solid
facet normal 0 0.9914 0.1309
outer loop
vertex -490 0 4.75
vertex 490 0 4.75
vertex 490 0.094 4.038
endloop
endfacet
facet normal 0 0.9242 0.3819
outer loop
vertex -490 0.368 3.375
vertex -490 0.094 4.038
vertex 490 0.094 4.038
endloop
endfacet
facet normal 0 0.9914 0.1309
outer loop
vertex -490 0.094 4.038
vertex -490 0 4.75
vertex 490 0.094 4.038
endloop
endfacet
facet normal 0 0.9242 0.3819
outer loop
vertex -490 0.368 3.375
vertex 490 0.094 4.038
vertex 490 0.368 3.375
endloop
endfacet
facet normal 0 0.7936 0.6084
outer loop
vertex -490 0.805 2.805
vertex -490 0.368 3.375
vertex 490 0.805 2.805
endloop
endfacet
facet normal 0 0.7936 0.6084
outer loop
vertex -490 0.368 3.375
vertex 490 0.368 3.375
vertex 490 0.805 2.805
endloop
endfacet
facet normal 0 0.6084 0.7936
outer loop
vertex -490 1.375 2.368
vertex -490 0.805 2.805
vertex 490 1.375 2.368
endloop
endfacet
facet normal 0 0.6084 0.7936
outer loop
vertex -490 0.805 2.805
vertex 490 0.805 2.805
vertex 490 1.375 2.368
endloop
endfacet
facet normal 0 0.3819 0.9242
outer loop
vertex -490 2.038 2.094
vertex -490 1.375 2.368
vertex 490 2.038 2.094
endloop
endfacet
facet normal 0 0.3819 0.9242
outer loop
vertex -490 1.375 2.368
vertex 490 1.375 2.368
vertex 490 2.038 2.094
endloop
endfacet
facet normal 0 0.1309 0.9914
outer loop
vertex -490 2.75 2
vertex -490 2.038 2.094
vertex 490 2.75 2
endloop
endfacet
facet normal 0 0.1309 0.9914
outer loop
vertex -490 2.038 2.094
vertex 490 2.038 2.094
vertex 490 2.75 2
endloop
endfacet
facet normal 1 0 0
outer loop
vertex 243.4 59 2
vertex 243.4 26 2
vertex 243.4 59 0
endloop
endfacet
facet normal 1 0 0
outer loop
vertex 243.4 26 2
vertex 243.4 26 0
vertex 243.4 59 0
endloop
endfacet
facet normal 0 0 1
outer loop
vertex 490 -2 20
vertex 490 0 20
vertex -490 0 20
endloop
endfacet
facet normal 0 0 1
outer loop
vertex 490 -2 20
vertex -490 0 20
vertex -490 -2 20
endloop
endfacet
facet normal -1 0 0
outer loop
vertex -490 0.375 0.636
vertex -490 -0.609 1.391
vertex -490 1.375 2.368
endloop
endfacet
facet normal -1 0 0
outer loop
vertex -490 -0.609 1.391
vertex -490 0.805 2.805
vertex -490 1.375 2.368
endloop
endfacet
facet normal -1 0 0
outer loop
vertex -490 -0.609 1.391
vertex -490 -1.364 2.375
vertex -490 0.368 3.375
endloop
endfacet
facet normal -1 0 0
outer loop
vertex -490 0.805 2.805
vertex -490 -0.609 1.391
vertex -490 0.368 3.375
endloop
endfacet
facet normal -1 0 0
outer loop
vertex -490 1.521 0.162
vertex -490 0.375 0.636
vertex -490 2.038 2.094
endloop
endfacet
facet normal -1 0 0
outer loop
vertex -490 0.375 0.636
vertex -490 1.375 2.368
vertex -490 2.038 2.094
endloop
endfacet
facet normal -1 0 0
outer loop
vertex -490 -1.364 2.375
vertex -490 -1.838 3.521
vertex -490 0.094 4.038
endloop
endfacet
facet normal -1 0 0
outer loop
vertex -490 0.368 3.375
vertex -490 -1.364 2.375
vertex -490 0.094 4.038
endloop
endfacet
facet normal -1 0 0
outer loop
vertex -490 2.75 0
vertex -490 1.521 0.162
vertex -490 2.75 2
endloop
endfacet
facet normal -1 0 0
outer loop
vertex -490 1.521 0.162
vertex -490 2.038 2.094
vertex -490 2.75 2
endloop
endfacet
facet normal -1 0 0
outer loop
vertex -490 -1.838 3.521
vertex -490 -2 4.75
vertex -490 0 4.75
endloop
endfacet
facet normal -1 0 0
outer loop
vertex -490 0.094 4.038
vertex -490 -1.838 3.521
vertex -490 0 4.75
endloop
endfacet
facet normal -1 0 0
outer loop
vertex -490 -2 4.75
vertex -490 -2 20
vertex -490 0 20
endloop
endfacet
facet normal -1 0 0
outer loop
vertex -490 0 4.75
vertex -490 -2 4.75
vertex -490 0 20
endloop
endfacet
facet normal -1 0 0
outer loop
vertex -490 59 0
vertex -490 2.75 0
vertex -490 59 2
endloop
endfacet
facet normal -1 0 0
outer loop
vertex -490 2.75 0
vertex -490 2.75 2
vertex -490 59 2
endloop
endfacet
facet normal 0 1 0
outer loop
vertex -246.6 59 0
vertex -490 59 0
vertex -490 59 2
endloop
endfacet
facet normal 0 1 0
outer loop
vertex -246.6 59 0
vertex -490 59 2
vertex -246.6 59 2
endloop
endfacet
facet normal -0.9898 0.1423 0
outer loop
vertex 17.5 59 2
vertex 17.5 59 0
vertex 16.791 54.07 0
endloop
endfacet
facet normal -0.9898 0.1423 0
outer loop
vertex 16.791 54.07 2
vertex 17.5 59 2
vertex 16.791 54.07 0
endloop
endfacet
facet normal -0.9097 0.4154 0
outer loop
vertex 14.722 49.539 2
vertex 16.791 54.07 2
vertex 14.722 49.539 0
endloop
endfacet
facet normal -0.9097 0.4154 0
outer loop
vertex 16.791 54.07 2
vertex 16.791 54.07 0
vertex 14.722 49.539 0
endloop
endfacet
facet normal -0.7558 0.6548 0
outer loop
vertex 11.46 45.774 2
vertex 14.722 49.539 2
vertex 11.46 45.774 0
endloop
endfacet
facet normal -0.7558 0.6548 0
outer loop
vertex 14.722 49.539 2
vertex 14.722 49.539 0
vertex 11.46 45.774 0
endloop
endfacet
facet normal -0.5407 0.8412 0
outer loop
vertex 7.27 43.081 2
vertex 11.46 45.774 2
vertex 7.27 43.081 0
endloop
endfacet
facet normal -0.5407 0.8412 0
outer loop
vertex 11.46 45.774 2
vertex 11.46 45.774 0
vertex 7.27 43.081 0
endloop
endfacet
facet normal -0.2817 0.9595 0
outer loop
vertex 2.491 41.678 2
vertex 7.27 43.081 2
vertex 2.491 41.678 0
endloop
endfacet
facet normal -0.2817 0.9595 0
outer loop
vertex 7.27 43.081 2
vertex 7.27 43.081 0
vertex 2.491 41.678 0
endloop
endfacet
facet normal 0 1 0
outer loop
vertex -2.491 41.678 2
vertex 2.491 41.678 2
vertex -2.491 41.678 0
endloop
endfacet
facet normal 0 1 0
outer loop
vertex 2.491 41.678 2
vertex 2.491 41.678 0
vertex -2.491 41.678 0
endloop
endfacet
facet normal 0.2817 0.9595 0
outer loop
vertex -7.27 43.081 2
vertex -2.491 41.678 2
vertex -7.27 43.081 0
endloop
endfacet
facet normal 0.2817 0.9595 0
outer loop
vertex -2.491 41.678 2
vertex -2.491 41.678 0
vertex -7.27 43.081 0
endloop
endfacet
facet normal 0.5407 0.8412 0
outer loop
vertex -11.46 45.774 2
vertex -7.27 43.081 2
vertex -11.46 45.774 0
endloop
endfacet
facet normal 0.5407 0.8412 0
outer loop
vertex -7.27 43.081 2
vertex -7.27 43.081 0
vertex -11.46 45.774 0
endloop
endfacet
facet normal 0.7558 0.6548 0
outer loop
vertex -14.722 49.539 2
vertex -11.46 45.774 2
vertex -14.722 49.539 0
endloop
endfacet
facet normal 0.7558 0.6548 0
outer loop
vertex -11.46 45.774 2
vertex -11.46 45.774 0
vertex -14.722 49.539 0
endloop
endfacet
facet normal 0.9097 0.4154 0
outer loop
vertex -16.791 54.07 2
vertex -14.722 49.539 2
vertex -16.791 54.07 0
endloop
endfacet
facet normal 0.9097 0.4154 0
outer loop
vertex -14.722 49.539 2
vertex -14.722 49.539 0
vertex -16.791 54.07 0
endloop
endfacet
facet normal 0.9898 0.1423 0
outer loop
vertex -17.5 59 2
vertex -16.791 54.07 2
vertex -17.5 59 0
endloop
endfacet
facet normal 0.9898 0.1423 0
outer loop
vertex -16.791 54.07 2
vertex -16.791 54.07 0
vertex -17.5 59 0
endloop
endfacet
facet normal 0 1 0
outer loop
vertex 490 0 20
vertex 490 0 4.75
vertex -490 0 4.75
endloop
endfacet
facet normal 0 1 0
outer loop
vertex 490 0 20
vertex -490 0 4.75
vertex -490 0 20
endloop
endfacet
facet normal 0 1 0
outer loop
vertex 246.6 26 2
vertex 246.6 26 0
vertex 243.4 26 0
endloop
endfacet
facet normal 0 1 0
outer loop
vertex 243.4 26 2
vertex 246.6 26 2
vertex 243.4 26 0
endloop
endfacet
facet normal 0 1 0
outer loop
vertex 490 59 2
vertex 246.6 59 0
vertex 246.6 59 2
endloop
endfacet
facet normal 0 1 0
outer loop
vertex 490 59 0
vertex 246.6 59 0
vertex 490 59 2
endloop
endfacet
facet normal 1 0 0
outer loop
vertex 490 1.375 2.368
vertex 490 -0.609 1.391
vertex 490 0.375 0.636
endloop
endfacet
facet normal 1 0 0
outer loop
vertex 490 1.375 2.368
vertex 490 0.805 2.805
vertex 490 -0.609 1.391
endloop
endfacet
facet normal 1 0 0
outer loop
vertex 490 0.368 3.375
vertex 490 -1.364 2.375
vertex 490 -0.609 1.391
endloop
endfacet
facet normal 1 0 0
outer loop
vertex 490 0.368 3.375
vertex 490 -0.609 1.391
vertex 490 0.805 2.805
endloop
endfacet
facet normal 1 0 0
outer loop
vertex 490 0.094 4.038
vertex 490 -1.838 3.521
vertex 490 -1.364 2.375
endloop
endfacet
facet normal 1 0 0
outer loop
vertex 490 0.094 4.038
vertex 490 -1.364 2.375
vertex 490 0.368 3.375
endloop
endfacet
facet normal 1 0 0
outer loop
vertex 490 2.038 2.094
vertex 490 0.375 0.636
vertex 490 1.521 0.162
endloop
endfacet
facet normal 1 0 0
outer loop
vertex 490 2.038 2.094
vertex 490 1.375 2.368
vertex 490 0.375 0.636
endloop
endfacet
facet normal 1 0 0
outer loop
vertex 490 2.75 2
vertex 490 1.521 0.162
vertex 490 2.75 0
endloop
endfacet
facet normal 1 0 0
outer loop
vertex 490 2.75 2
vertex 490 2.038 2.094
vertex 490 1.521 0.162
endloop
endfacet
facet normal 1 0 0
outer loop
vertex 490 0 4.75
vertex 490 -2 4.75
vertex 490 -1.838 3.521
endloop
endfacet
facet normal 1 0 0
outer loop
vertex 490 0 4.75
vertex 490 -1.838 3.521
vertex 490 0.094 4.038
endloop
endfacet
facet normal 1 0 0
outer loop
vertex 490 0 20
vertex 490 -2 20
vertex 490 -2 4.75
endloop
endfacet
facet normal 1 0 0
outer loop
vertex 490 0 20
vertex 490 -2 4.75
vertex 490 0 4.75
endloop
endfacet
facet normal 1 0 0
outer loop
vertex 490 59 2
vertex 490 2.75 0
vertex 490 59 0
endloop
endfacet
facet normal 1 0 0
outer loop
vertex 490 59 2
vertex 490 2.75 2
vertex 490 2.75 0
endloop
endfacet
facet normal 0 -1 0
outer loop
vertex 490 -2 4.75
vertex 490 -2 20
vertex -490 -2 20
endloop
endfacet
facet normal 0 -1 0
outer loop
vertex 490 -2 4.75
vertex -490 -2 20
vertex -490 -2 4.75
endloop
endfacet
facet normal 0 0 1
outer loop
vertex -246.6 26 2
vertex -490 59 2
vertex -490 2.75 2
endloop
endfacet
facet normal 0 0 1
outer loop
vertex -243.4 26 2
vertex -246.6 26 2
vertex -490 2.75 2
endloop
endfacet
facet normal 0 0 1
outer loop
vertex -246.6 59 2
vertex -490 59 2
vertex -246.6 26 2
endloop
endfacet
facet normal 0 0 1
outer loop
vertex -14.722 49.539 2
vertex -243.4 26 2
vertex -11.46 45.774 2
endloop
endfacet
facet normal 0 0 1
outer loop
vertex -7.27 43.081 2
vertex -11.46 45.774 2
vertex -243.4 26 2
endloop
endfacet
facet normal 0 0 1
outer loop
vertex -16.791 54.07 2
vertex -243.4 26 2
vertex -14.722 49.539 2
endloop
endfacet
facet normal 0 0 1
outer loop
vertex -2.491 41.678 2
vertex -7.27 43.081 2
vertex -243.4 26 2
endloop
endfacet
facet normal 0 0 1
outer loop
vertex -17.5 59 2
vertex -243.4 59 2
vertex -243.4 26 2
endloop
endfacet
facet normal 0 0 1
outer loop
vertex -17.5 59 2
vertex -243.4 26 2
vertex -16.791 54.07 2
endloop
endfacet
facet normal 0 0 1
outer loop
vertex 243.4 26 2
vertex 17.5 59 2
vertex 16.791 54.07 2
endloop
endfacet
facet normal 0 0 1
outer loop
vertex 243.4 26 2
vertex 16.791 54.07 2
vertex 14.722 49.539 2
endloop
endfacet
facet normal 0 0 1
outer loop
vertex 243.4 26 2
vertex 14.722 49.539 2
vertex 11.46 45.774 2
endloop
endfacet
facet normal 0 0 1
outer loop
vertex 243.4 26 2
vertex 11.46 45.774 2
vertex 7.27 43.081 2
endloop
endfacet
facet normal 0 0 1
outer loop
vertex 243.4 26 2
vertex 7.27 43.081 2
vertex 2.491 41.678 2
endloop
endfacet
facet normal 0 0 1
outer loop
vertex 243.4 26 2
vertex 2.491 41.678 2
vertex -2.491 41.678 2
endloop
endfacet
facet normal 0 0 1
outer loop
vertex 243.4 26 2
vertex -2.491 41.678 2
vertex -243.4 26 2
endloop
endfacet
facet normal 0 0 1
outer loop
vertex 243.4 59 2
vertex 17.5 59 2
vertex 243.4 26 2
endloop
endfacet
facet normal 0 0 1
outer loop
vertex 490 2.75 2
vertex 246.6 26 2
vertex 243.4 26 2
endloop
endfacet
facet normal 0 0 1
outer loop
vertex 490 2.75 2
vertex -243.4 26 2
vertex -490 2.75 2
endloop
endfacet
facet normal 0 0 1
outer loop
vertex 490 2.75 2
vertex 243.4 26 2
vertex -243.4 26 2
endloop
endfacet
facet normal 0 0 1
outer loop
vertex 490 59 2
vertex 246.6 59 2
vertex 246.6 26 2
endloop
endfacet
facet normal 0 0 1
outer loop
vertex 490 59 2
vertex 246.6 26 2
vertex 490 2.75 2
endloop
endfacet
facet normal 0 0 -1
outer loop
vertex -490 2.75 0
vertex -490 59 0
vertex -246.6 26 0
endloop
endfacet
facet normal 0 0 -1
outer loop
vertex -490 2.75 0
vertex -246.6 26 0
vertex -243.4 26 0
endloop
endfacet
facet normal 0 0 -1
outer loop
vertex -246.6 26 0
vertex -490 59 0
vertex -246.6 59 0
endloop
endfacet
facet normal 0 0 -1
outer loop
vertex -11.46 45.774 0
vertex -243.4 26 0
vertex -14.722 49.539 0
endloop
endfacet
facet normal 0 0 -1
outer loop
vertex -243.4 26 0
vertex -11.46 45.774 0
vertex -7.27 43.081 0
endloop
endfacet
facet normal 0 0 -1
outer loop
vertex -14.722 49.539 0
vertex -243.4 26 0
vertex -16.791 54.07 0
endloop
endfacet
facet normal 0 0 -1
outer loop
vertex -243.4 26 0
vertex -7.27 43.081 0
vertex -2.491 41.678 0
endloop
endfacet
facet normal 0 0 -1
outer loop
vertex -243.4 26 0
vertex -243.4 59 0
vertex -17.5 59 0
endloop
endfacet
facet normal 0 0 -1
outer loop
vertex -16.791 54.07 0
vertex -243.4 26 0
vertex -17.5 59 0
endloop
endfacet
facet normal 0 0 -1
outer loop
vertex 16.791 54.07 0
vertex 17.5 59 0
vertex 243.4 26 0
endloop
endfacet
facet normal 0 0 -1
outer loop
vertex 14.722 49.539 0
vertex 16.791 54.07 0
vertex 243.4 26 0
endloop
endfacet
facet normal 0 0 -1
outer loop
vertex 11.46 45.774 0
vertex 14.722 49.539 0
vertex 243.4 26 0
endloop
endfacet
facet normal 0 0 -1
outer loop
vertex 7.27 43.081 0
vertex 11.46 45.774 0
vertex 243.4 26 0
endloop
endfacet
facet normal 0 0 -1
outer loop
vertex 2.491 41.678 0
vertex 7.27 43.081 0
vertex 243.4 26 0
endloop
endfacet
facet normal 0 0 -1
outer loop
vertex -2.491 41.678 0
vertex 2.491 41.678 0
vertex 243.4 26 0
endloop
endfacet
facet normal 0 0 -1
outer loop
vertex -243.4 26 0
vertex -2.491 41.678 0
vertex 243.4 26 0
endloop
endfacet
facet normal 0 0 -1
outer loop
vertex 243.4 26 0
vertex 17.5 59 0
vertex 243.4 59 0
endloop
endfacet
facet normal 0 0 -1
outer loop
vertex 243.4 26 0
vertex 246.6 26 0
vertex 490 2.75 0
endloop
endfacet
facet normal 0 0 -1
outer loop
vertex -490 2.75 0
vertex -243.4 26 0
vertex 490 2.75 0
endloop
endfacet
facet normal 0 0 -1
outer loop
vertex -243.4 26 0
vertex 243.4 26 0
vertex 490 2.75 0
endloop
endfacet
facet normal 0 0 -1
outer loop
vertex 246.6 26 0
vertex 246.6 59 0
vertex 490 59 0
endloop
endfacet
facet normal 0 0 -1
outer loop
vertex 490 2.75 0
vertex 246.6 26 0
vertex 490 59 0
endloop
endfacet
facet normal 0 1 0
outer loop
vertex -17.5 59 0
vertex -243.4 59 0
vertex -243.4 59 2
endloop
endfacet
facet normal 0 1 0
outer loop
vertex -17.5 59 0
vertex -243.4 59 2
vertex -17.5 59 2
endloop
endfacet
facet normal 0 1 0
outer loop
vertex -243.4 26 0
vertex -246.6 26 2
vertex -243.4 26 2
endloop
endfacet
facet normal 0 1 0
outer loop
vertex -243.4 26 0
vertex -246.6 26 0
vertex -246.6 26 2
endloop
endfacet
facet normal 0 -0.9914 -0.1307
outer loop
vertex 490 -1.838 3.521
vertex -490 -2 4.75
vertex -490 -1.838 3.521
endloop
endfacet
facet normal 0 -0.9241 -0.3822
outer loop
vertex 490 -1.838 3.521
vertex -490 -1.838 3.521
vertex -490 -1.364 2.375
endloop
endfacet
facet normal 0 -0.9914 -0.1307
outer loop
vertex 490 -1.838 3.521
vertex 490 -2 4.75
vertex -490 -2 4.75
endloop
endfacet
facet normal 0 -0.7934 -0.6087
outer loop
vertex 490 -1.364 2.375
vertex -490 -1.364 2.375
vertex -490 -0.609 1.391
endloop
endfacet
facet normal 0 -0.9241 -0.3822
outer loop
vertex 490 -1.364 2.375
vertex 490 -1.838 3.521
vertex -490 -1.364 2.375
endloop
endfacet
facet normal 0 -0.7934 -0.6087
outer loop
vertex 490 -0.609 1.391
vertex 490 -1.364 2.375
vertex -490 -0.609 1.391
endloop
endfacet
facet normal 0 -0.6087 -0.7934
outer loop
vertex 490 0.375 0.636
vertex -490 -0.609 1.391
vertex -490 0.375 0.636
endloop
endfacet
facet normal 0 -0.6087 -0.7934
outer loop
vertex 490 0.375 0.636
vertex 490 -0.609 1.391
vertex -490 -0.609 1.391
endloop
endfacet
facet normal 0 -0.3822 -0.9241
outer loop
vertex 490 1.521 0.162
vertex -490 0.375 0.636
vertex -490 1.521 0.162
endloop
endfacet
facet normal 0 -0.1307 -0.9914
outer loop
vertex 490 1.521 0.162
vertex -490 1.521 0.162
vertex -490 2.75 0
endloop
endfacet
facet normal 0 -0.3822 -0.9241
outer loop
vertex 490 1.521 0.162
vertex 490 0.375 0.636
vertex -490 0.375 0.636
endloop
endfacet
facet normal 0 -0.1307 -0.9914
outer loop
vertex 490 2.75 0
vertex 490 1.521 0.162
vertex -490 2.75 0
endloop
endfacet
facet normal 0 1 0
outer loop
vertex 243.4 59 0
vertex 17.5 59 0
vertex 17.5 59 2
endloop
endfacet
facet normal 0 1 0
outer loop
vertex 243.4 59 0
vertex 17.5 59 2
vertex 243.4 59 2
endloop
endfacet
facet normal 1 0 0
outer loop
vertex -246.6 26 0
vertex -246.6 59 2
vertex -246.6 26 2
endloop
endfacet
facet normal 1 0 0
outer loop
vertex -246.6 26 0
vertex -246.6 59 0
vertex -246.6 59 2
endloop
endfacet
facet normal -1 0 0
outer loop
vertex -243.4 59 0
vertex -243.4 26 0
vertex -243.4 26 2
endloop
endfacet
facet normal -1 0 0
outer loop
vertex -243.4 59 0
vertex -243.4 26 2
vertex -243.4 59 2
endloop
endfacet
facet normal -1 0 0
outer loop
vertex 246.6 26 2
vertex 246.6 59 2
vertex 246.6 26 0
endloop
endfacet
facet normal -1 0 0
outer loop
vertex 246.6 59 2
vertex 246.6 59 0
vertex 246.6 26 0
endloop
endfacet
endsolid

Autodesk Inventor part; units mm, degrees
ref_plane "YZ Plane" through (0, 0, 0) normal (1, 0, 0) x (0, 1, 0)
ref_plane "XZ Plane" through (0, 0, 0) normal (0, 1, 0) x (-1, 0, 0)
ref_plane "XY Plane" through (0, 0, 0) normal (0, 0, 1) x (1, 0, 0)
sketch "Sketch1" plane through (0, 0, 0) normal (0, 0, 1) x (1, 0, 0)
  line L0 (-490, 59) -> (490, 59)
  line L1 (490, 59) -> (490, 0)
  line L2 (490, 0) -> (-490, 0)
  line L3 (-490, 0) -> (-490, 59)
  point P0 (0, 0)
  point P1 (0, 0)
  dimension "d0" = 980
  dimension "d1" = 59
extrude "Plate1" add sketch "Sketch1" along normal blind 2
sketch "Sketch2" plane through (490, -2, 0) normal (0, 1, 0) x (-1, 0, 0)
  line L0 (980, 0) -> (0, 0)
  line L1 (0, 0) -> (0, 20)
  line L2 (0, 20) -> (980, 20)
  line L3 (980, 20) -> (980, 0)
edge flange "Flange1" height 20 angle 90 thickness 2 bend radius 2.75 thickness toward (0, 1, 0) relief round relief width 2 relief depth 1 edges at (0, 0, 2) wall of the first edge with corners at (-490, -2, 0) (490, -2, 0) (490, -2, 20) (-490, -2, 20)
bend "Bend1"
corner "Corner1"
sketch "Sketch5" plane through (0, 0, 0) normal (0, 0, -1) x (-1, 0, 0)
  line L0 (490, 59) -> (-490, 59) projected
  line L1 (490, -2) -> (-490, -2) projected
  circle A0 centre (0, 59) radius 17.5
  line L2 (243.4, 59) -> (246.6, 59)
  line L3 (246.6, 59) -> (246.6, 26)
  line L4 (246.6, 26) -> (243.4, 26)
  line L5 (243.4, 26) -> (243.4, 59)
  line L6 (-243.4, 59) -> (-246.6, 59)
  line L7 (-246.6, 59) -> (-246.6, 26)
  line L8 (-246.6, 26) -> (-243.4, 26)
  line L9 (-243.4, 26) -> (-243.4, 59)
  line L10 (0, 59) -> (0, -2) construction
  point P0 (0, 0)
  point P1 (-490, -2)
  point P2 (245, 26)
  point P3 (-245, 26)
  point P4 (246.6, 59)
  point P5 (-17.5, 59)
  point P6 (17.5, 59)
  point P7 (-246.6, 59)
  dimension "d45" = 35
  dimension "d48" = 3.2
  dimension "d49" = 490
  dimension "d51" = 28
  dimension "d52" = 33
extrude "Extrusion1" cut sketch "Sketch5" against normal through all contours L3 L4 L5 L0 | L9 L8 L7 L0 | A0 L0 picked at (-2.238, 52.1497)
sketch "Sketch9" plane through (0, 0, 2) normal (0, 0, 1) x (1, 0, 0)
  line L0 (485.6141, 29.596) -> (485.6141, 17.596) construction
  line L1 (485.6141, 17.596) -> (285.6141, 17.596) construction
  line L2 (285.6141, 17.596) -> (285.6141, 29.596) construction
  line L3 (285.6141, 29.596) -> (485.6141, 29.596) construction
  line L4 (-490, 59) -> (490, 59) projected
  point P0 (0, 0)
  point P1 (1.05, 68)
  point P2 (490, 59)
  dimension "d40" = 200
  dimension "d41" = 12
mark "Mark2"
equation "\"d2\" = Thickness"
equation "\"d3\" = BendReliefWidth"
equation "\"d4\" = BendReliefDepth"
equation "\"d5\" = MinimumRemnant"
equation "\"d6\" = TransitionRadius"
equation "\"d9\" = BendRadius"
equation "\"d10\" = CornerReliefSize"
equation "\"d11\" = GapSize"
equation "\"d12\" = JacobiRadiusSize"
equation "\"BendReliefWidth\" = Thickness"
equation "\"BendReliefDepth\" = 0.5 * Thickness"
equation "\"CornerReliefSize\" = 4 * Thickness"
equation "\"MinimumRemnant\" = 2 * Thickness"
equation "\"TransitionRadius\" = BendRadius"
equation "\"JacobiRadiusSize\" = BendRadius"
equation "\"GapSize\" = Thickness"
equation "\"Thickness\" = 2"
equation "\"BendRadius\" = 2.75"
properties part number "MSC 341 stringer BOARD  #" material "Stainless Steel"
